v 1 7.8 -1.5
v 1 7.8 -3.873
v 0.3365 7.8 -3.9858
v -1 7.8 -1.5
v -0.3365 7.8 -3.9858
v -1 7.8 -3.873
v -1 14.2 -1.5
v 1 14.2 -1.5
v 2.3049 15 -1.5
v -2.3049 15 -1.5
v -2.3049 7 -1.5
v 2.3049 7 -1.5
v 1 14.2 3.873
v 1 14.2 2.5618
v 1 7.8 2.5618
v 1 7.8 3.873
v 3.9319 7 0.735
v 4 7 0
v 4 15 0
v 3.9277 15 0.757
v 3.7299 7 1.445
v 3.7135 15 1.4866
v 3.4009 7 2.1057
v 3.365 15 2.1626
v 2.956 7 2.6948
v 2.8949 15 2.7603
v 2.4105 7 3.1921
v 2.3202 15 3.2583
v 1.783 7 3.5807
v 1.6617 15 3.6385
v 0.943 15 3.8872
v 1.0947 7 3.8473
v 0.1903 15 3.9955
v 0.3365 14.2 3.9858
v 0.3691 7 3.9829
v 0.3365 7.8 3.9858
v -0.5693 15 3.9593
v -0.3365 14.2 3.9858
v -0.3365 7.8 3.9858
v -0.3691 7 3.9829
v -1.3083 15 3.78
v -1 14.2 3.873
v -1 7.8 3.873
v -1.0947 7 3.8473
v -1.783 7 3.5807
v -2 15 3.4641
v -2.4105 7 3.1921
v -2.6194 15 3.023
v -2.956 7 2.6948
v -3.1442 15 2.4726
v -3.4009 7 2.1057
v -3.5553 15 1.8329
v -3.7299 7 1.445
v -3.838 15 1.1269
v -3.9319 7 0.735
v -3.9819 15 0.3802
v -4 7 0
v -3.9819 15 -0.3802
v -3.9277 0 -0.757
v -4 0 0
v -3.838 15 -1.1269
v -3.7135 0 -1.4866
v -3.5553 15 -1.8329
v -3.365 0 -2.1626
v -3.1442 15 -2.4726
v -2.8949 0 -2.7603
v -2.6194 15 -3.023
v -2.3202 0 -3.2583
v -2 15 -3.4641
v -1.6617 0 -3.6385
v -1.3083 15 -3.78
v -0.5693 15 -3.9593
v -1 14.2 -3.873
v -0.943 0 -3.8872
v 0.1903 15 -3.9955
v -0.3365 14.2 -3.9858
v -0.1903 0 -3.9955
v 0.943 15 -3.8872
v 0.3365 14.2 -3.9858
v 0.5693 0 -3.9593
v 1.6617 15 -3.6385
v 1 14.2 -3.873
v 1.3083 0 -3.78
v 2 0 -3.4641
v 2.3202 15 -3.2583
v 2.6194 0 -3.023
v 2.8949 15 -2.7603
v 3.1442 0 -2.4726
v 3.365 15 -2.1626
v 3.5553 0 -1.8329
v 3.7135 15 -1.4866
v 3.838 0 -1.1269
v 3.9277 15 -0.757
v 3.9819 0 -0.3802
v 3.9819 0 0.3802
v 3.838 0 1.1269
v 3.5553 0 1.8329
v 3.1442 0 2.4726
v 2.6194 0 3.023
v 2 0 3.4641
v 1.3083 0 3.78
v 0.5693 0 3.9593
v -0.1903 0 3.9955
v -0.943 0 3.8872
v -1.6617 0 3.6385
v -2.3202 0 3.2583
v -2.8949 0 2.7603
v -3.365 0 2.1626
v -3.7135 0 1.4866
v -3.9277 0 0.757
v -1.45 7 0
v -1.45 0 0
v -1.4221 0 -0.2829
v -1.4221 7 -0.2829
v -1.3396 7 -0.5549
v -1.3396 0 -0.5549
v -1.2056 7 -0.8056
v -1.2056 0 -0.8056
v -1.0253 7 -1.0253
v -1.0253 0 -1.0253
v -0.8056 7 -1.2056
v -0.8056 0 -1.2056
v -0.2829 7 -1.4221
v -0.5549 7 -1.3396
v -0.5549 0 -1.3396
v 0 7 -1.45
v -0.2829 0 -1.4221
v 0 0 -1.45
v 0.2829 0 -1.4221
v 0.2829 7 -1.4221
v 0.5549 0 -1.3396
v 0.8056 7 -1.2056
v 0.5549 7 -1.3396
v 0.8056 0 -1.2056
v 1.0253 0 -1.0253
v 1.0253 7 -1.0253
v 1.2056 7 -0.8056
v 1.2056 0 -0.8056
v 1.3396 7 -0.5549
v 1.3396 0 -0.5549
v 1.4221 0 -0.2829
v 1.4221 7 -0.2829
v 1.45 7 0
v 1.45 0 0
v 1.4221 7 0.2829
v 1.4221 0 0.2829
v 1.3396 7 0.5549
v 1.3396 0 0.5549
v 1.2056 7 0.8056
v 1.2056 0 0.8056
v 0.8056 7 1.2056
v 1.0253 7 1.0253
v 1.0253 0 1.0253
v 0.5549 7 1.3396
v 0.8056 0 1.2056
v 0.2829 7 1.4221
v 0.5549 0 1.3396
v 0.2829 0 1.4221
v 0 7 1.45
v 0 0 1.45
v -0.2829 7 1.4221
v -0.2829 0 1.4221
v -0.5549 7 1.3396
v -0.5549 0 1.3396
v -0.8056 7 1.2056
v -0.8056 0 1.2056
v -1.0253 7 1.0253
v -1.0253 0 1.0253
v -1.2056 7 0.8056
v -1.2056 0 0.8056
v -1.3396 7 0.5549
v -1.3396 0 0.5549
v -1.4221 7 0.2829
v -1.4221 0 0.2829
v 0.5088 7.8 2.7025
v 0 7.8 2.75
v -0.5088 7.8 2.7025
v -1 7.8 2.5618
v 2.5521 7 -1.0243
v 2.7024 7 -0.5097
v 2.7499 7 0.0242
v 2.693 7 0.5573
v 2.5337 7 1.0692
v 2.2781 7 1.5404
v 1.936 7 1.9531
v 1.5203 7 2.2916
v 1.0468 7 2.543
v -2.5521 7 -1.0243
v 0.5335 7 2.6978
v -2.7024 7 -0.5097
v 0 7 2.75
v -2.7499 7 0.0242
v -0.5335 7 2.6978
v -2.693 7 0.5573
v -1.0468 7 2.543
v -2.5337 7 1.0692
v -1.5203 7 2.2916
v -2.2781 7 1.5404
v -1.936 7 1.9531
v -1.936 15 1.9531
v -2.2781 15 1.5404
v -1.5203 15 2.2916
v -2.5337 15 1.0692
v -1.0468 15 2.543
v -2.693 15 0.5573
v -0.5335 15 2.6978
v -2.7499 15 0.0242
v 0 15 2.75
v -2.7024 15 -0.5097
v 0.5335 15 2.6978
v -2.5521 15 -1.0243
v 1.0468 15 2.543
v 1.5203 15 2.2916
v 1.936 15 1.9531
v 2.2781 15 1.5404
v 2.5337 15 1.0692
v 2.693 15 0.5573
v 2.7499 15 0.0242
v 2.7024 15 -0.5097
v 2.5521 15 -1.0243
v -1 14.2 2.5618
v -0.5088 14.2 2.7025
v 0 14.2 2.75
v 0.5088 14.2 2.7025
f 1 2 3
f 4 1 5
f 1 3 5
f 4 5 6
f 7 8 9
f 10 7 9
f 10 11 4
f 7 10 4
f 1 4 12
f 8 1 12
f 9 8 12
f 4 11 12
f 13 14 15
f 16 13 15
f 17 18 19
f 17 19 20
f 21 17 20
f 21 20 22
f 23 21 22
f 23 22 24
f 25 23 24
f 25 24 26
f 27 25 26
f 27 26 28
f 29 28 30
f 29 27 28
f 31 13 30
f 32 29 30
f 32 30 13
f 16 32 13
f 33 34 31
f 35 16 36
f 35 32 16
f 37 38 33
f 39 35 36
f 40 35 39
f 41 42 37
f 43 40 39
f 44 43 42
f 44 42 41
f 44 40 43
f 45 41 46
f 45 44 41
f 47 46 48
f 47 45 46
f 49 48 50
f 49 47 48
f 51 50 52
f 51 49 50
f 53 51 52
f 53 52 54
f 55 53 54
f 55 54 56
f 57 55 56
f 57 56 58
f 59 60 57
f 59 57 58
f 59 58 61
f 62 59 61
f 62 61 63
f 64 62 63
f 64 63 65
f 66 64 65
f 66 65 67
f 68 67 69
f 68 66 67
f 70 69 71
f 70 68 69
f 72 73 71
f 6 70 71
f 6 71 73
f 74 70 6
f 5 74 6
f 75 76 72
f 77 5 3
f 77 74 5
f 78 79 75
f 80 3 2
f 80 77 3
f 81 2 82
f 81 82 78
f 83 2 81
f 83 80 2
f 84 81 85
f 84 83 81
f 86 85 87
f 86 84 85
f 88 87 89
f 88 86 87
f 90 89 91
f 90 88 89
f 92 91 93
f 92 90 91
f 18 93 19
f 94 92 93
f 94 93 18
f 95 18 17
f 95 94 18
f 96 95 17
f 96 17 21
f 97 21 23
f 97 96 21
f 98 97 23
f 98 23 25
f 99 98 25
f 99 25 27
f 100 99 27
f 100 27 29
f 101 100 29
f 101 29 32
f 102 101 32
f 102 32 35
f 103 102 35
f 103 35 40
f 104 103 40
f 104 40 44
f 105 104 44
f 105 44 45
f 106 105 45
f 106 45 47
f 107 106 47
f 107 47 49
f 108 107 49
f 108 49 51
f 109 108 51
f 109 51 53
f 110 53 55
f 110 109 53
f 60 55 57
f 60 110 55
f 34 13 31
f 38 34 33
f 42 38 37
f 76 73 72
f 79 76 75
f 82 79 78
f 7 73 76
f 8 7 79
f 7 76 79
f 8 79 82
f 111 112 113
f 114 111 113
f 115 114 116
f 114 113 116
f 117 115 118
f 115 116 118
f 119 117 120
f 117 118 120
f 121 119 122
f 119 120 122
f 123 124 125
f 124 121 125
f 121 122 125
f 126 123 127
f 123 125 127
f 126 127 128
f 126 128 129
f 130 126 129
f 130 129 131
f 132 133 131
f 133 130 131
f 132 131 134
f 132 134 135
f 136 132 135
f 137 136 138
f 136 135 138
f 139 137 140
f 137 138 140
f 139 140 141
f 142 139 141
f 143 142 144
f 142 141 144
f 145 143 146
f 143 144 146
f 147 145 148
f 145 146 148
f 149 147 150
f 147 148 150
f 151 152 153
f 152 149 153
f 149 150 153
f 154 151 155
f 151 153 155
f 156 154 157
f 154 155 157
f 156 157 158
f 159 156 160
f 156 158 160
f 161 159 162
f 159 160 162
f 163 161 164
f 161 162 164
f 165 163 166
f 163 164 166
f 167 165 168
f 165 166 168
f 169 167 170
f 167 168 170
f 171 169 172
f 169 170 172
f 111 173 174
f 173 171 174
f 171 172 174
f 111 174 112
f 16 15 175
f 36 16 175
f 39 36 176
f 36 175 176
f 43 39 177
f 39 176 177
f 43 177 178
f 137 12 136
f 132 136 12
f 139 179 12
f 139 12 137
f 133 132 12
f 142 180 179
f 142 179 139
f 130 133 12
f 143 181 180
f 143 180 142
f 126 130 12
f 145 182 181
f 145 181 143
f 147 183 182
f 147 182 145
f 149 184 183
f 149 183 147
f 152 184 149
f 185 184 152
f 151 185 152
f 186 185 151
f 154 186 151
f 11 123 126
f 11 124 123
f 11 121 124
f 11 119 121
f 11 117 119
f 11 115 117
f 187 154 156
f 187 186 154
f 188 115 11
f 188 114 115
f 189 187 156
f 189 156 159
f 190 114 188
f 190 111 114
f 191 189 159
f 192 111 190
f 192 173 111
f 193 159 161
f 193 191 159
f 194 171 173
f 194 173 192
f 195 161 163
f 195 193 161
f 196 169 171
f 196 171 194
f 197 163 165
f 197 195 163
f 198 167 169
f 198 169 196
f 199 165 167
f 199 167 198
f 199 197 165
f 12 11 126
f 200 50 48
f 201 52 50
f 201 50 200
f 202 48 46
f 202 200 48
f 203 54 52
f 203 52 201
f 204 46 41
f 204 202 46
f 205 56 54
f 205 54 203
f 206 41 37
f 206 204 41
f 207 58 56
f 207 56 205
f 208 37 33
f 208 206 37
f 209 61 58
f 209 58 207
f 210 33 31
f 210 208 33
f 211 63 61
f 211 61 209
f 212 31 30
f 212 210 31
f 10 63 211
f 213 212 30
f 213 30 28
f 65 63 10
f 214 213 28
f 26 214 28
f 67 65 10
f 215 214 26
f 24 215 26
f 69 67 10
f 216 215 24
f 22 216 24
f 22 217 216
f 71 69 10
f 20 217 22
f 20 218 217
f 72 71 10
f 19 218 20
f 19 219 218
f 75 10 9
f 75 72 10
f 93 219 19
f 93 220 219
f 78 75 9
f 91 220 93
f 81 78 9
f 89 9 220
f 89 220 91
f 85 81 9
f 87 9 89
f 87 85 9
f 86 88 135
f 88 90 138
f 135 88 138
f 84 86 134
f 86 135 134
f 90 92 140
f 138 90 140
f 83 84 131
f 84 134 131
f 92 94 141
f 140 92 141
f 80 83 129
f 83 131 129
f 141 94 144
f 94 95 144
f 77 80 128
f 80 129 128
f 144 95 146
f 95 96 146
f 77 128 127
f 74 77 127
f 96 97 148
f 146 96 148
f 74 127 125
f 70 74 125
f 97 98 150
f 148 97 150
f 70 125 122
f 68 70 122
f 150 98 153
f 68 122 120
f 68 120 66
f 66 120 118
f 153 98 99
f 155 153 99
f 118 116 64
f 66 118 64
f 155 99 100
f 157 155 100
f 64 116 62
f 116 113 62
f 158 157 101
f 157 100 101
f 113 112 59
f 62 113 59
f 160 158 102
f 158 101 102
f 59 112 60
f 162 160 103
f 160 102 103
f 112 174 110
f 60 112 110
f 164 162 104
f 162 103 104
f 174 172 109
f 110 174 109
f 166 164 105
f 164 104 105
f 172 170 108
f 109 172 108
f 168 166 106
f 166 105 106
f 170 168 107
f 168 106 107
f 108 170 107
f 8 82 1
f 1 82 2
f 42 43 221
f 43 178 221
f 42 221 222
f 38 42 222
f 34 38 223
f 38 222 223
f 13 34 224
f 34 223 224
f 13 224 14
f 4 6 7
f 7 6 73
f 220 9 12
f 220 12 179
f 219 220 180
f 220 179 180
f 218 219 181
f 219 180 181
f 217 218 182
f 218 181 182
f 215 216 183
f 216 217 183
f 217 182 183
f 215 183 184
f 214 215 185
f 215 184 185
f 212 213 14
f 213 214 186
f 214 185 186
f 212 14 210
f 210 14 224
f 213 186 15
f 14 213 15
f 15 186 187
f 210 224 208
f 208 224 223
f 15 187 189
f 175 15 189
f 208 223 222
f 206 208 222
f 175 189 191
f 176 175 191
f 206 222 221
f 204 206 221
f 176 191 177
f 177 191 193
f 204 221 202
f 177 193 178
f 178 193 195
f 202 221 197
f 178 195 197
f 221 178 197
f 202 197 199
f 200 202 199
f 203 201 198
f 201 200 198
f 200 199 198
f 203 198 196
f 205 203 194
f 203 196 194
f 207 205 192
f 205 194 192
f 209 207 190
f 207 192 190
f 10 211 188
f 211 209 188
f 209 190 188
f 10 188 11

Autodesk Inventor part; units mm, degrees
ref_plane "YZ Plane" through (0, 0, 0) normal (1, 0, 0) x (0, 1, 0)
ref_plane "XZ Plane" through (0, 0, 0) normal (0, 1, 0) x (-1, 0, 0)
ref_plane "XY Plane" through (0, 0, 0) normal (0, 0, 1) x (1, 0, 0)
sketch "Esquisse1" plane through (0, 0, 0) normal (0, 1, 0) x (-1, 0, 0)
  circle A0 centre (0, 0) radius 1.45
  circle A1 centre (0, 0) radius 4
  dimension "d0" = 8
  dimension "d1" = 2.9
extrude "Extrusion1" add sketch "Esquisse1" along normal blind 7
sketch "Esquisse2" plane through (0, 7, 0) normal (0, 1, 0) x (1, 0, 0)
  circle A0 centre (0, 0) radius 1.45 projected
  circle A1 centre (0, 0) radius 4 projected
  arc A2 (-2.3049, 1.5) -> (2.3049, 1.5) centre (0, 0) ccw
  line L0 (-2.3049, 1.5) -> (2.3049, 1.5)
  arc A3 (2.3049, 1.5) -> (-2.3049, 1.5) centre (0, 0) ccw construction
  dimension "d4" = 5.5
  dimension "d5" = 1.5
extrude "Extrusion2" add sketch "Esquisse2" along normal blind 8 contours A1
sketch "Esquisse3" plane through (-2.3049, 7, -1.5) normal (0, 0, 1) x (1, 0, 0)
  line L0 (4.6098, 0) -> (0, 0) projected
  line L1 (4.6098, 0) -> (4.6098, 8) projected
  line L2 (0, 8) -> (4.6098, 8) projected
  line L3 (1.3049, 7.2) -> (3.3049, 7.2)
  line L4 (3.3049, 7.2) -> (3.3049, 0.8)
  line L5 (3.3049, 0.8) -> (1.3049, 0.8)
  line L6 (1.3049, 0.8) -> (1.3049, 7.2)
  point P0 (2.3049, -7)
  dimension "d8" = 2
  dimension "d9" = 0.8
  dimension "d10" = 0.8
  dimension "d11" = 1.3049
  dimension "d12" = 4.6098
extrude "Extrusion3" cut sketch "Esquisse3" along normal through all both and the other way through all
equation "\"d9\" = d10"
equation "\"d11\" = -0.5 * d8 + 0.5 * d12"
properties part number "axe"
